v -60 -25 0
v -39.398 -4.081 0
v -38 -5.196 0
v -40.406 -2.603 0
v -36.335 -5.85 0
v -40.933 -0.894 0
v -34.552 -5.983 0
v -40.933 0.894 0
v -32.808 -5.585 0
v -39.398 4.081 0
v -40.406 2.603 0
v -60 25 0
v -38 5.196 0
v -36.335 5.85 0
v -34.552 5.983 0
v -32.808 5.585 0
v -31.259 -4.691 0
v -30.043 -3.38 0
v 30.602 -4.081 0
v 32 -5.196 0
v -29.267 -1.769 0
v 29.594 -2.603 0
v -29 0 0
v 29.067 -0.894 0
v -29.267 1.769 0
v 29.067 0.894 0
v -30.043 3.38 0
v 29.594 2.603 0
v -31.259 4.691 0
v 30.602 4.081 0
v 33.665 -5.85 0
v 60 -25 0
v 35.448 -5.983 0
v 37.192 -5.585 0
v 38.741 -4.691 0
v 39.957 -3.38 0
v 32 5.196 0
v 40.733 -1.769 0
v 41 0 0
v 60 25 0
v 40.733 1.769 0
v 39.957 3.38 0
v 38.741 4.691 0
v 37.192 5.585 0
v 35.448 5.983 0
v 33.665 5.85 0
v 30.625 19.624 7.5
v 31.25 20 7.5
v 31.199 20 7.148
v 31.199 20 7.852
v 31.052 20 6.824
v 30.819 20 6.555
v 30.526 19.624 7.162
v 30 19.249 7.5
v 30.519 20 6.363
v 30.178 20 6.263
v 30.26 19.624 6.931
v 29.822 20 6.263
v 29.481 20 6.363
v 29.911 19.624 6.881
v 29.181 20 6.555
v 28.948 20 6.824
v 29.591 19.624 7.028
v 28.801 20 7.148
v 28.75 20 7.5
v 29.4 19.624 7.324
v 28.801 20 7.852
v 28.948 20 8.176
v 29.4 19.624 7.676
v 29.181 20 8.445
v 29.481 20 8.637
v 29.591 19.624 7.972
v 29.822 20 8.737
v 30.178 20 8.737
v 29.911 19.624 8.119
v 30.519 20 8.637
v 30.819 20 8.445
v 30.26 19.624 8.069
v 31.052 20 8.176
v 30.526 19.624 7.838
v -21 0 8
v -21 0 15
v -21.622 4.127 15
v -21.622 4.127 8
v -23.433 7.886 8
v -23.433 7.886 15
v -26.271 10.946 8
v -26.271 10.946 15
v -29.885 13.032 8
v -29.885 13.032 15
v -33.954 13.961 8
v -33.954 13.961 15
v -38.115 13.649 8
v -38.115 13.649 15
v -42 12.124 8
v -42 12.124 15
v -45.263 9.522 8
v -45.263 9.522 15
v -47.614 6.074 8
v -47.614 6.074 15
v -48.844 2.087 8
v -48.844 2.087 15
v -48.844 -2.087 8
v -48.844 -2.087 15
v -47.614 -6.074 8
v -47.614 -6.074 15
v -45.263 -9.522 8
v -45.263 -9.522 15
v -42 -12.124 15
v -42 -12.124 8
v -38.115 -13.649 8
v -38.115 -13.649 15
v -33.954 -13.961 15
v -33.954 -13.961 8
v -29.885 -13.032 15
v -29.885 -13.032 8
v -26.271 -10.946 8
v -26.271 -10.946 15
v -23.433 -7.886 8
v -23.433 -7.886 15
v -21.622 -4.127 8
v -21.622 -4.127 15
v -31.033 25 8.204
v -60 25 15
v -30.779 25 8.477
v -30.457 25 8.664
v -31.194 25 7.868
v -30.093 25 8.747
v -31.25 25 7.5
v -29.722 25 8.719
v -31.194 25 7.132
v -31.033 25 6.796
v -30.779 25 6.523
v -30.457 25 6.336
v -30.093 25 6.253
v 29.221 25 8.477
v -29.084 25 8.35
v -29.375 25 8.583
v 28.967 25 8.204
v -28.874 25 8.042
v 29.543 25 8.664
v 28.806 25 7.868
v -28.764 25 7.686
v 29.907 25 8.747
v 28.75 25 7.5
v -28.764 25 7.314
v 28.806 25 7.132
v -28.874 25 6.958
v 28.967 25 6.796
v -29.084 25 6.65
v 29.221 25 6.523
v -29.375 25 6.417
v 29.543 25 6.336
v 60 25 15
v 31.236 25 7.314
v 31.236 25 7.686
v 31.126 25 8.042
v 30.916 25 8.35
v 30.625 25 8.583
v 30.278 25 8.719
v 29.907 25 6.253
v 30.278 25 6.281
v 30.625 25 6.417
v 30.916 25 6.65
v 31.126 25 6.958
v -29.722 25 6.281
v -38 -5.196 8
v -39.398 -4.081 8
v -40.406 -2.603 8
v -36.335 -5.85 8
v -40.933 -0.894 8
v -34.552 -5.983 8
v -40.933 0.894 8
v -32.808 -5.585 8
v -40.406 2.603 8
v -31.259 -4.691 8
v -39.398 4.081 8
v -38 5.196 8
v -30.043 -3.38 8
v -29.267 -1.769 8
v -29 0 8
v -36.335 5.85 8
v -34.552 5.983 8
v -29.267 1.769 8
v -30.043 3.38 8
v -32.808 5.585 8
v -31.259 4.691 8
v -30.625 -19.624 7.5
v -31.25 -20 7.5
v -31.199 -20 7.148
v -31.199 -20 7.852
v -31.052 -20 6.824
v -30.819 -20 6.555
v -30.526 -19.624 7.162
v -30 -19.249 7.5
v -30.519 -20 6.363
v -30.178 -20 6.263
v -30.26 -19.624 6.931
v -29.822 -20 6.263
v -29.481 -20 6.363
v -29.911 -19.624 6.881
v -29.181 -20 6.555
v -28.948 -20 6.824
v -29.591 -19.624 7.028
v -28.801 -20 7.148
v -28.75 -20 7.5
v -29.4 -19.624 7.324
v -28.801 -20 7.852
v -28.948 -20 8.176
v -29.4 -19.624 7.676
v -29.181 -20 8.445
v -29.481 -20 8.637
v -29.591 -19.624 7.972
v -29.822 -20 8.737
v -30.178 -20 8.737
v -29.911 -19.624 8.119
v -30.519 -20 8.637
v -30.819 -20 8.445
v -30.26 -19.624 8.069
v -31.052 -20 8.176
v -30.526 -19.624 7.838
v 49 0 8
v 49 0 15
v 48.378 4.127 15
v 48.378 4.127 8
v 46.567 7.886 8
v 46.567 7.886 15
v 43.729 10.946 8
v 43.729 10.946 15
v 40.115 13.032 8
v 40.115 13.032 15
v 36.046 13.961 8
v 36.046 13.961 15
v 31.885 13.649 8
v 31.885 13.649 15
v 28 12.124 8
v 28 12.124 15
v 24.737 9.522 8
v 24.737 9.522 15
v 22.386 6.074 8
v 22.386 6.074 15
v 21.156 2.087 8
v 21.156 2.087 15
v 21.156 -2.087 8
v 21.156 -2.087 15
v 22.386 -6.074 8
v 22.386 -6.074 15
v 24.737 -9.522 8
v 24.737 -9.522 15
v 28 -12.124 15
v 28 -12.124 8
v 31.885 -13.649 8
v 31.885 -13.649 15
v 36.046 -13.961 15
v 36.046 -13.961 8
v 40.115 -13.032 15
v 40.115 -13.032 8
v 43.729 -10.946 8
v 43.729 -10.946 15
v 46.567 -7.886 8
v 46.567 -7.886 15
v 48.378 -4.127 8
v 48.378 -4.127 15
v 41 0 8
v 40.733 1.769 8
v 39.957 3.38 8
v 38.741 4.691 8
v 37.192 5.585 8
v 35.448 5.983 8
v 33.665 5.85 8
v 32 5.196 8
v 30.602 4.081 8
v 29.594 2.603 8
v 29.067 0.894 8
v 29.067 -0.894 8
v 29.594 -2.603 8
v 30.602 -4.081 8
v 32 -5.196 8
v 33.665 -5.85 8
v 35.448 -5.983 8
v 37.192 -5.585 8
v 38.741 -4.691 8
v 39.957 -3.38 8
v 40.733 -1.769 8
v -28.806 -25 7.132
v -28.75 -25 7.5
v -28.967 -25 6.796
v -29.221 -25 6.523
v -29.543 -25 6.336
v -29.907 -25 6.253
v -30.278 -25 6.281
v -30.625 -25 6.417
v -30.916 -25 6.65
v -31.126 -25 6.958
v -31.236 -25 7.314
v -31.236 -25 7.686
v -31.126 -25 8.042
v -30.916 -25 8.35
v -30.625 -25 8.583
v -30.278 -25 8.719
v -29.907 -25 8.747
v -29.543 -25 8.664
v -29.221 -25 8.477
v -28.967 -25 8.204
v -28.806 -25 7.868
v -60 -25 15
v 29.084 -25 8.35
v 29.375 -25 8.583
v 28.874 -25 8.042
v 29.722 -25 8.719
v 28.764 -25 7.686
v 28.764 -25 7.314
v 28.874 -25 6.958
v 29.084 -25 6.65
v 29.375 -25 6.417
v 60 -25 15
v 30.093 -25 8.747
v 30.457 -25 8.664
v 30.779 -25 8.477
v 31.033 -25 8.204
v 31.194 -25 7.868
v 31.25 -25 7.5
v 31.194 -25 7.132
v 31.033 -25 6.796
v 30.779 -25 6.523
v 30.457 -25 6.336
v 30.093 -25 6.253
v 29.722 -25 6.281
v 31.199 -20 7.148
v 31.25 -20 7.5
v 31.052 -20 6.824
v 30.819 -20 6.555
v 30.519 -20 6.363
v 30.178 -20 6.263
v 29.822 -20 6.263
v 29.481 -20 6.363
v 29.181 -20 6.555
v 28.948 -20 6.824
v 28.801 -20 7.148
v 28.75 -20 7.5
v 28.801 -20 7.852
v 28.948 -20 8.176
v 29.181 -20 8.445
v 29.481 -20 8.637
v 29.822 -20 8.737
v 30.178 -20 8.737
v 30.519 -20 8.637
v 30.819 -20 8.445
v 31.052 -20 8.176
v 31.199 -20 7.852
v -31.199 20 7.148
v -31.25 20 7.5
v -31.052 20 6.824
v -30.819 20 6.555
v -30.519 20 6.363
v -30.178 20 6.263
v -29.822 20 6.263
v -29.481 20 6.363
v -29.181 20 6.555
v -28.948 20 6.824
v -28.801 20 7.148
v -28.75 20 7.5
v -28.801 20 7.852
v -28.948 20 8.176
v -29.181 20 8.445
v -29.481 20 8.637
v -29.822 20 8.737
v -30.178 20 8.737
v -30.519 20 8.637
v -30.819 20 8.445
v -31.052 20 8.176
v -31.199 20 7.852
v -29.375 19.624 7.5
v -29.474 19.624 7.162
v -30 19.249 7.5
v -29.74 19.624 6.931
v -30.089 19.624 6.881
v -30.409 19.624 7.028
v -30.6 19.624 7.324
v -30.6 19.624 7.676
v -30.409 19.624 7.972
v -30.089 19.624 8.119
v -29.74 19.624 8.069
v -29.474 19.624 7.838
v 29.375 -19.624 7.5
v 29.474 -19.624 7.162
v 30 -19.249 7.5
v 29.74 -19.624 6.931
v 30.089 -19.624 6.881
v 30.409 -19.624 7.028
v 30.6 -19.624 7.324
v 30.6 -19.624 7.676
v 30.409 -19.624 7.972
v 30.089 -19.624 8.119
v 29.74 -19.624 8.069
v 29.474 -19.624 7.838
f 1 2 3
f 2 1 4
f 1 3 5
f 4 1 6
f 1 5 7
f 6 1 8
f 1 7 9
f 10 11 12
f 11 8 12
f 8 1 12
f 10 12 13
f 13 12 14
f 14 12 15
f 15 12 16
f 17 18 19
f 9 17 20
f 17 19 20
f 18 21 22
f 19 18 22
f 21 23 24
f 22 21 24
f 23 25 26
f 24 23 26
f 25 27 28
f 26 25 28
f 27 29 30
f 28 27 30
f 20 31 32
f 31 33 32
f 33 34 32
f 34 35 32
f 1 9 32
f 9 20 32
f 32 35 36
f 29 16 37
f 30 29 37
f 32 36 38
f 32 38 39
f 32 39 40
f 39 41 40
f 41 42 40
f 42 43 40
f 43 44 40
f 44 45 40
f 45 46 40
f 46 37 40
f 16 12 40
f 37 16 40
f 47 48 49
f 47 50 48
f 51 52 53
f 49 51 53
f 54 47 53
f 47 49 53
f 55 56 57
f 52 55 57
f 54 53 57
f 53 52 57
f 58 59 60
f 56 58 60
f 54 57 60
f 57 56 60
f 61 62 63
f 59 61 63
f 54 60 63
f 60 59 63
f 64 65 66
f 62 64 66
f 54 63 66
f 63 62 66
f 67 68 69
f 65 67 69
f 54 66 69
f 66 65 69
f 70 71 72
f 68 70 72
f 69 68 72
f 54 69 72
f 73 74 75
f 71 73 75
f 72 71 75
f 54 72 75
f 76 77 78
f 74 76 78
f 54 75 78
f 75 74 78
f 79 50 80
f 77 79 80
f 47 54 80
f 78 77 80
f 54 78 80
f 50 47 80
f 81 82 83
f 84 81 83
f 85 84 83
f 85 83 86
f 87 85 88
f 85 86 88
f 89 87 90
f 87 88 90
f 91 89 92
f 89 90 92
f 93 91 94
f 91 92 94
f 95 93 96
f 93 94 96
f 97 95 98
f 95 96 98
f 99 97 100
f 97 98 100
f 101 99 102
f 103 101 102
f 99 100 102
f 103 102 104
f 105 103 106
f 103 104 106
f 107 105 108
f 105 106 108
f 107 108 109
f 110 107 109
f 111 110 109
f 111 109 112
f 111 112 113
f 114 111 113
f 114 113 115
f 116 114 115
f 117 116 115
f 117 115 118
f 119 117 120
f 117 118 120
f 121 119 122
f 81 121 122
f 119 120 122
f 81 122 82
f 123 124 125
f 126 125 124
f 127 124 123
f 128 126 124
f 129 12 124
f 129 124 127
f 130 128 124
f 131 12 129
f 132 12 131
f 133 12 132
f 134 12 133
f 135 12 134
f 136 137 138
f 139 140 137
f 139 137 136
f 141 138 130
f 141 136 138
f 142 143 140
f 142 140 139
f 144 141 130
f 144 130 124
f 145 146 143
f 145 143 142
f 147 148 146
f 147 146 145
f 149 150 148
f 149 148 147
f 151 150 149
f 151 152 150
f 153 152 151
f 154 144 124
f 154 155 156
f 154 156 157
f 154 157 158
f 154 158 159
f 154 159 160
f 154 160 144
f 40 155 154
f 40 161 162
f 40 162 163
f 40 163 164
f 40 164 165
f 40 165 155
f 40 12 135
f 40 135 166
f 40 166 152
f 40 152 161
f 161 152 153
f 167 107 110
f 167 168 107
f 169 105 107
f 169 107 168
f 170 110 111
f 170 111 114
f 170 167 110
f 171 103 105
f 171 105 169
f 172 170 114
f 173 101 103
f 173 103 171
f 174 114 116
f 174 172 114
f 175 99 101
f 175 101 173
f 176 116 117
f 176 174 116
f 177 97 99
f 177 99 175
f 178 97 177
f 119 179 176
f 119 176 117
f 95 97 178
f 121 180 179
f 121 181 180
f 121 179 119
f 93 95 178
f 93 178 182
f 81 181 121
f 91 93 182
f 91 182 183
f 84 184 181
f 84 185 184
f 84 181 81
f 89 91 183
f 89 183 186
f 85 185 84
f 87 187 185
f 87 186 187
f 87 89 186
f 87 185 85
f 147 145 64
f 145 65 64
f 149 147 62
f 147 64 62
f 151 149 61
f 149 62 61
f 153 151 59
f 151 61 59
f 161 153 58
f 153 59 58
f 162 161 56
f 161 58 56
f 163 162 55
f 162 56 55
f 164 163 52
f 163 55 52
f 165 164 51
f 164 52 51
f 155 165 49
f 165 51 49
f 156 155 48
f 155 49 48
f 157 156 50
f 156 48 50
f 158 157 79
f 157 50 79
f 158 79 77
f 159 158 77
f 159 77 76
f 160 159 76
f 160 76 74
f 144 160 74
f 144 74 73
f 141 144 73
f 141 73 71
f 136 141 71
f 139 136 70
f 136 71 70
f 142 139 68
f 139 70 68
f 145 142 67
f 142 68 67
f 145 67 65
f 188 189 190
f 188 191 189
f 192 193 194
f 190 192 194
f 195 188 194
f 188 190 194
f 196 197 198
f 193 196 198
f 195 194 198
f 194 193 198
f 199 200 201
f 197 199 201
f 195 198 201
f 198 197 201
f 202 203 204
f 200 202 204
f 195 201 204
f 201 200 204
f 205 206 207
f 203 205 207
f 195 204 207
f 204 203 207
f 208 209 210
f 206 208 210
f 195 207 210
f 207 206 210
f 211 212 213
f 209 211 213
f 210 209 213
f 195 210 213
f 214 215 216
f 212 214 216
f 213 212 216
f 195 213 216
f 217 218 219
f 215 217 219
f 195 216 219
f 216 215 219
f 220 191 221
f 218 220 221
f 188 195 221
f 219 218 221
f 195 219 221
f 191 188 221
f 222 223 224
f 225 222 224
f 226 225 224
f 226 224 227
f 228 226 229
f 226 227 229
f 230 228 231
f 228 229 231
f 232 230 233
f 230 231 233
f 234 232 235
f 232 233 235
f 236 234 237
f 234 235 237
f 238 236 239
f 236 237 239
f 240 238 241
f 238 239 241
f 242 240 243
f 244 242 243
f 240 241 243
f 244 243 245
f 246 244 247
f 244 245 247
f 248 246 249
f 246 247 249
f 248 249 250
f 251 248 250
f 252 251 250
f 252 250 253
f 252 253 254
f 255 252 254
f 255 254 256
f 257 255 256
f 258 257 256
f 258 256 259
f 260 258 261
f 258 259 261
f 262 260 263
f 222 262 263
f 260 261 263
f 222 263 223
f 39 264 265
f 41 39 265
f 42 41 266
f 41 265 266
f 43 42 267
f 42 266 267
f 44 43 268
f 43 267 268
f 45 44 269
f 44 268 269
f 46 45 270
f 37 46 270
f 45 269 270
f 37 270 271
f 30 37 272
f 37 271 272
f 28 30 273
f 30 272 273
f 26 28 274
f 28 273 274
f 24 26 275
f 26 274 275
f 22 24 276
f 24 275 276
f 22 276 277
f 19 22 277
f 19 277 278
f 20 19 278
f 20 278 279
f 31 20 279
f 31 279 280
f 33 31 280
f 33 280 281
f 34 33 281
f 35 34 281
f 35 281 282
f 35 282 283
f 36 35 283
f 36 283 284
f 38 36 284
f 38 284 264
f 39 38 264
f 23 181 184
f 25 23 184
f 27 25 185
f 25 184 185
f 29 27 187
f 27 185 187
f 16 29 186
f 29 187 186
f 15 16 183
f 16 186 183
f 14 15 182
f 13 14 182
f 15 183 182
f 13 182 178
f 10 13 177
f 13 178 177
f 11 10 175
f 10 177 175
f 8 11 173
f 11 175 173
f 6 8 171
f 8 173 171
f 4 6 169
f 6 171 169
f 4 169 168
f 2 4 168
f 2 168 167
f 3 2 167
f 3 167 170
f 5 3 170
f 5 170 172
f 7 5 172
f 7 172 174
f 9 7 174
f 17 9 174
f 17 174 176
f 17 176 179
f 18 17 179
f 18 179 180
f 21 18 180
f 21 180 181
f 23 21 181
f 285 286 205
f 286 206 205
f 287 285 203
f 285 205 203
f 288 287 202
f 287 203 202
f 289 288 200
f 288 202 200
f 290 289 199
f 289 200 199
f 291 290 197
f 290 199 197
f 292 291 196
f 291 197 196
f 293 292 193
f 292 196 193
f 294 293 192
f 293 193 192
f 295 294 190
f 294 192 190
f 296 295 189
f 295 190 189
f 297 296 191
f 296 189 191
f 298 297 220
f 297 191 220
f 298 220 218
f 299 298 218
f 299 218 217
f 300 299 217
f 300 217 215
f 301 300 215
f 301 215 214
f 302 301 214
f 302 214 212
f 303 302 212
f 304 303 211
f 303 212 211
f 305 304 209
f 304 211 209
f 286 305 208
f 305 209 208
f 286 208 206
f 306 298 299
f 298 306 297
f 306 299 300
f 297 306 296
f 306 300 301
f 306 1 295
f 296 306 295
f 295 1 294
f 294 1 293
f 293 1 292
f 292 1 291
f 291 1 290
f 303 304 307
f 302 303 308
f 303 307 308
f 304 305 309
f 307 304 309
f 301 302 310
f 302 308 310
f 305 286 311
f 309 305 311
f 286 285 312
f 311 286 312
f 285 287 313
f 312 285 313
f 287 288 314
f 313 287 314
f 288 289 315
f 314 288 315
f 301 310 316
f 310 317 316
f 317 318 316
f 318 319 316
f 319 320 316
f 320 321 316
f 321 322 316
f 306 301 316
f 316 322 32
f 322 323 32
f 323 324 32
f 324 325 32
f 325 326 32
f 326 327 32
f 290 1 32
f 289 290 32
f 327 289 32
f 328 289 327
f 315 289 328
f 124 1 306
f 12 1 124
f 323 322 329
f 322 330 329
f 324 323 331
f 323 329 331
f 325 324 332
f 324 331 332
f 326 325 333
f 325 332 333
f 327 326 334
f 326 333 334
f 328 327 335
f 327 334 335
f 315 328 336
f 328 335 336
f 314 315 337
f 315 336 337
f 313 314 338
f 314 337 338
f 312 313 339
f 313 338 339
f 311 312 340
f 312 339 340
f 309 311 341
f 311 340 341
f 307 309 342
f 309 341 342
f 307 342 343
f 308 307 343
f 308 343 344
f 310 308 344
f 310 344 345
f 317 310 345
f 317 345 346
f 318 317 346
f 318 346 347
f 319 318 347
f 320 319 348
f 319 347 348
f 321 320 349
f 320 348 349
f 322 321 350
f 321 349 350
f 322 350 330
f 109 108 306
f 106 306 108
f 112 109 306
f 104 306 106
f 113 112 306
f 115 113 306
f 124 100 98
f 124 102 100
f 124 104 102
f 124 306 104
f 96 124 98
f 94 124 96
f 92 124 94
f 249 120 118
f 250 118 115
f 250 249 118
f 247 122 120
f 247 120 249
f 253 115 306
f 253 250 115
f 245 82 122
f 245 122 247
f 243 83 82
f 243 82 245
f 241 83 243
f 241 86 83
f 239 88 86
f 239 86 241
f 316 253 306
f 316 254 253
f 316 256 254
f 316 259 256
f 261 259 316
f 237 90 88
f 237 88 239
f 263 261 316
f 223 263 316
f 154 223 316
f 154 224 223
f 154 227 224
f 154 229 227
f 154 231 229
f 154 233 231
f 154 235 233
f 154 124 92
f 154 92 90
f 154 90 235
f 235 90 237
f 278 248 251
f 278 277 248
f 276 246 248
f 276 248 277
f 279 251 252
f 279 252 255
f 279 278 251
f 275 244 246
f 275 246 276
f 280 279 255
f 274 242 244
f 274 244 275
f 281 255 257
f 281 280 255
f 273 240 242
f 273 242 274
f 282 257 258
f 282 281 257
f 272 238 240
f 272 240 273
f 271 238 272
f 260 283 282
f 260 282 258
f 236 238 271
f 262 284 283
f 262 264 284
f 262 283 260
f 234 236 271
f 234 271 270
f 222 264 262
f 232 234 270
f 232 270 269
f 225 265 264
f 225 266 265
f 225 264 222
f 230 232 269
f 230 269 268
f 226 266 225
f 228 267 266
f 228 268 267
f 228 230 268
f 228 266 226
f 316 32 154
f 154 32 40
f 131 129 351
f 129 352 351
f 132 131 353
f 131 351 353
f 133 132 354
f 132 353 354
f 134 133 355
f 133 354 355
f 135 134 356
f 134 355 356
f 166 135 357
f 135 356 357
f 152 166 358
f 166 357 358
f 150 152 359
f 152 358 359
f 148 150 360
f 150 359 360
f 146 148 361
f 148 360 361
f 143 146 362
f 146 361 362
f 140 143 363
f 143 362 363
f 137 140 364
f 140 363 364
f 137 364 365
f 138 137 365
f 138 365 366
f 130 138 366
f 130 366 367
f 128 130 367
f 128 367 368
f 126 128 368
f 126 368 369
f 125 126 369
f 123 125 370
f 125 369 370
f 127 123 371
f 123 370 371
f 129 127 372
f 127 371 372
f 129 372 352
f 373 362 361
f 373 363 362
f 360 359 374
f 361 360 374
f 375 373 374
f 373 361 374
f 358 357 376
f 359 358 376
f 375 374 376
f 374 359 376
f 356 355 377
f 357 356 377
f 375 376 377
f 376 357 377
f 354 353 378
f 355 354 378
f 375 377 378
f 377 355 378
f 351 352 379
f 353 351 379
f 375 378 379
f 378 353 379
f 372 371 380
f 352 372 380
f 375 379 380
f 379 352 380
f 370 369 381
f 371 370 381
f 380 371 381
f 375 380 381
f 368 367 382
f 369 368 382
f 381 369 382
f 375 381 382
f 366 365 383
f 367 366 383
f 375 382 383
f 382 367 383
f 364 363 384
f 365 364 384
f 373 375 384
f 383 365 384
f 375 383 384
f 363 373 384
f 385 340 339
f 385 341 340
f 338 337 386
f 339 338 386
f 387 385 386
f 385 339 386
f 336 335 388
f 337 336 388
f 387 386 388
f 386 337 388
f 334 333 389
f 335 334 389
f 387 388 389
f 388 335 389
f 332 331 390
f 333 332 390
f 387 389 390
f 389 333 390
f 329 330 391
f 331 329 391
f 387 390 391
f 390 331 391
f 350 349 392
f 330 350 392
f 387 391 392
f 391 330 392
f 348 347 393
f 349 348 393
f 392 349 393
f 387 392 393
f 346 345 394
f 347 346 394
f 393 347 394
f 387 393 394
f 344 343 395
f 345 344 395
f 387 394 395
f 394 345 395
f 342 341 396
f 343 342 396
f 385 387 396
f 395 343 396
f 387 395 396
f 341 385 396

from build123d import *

# Parameters (mm, degrees)
SKETCH_1_W             = 120
SKETCH_1_H             = 50
EXTRUDE_1_DEPTH        = 15
CUT_EXTRUDE_1_REACH    = 68.708
SKETCH_2_R             = 6
HOLE_WIZARD_M3_1_D     = 2.5
HOLE_WIZARD_M3_1_DEPTH = 5
HOLE_WIZARD_M3_1_TIP   = 0.751075774
HOLE_WIZARD_M3_2_D     = 2.5
HOLE_WIZARD_M3_2_DEPTH = 5
HOLE_WIZARD_M3_2_TIP   = 0.751075774
SKETCH_19_R            = 14
CUT_EXTRUDE_3_DEPTH    = 7


with BuildPart() as part:
    # 草图1 → 凸台-拉伸1 (new body)
    with BuildSketch(Plane.XY):
        Rectangle(SKETCH_1_W, SKETCH_1_H)
    extrude(amount=EXTRUDE_1_DEPTH)

    # 草图2 → 切除-拉伸1 (cut, up to next)
    with BuildSketch(Plane.XY.offset(15), mode=Mode.PRIVATE) as cut_extrude_1_sk1:
        with Locations((-35, 0)):
            Circle(SKETCH_2_R)
    cut_extrude_1_tool1 = extrude(cut_extrude_1_sk1.sketch, amount=-CUT_EXTRUDE_1_REACH, mode=Mode.PRIVATE) & part.part
    # 草图2 → 切除-拉伸1 (cut, up to next)
    with BuildSketch(Plane.XY.offset(15), mode=Mode.PRIVATE) as cut_extrude_1_sk2:
        with Locations((35, 0)):
            Circle(SKETCH_2_R)
    cut_extrude_1_tool2 = extrude(cut_extrude_1_sk2.sketch, amount=-CUT_EXTRUDE_1_REACH, mode=Mode.PRIVATE) & part.part
    add(cut_extrude_1_tool1.solids().sort_by_distance((-35, 0, 15))[0], mode=Mode.SUBTRACT)
    add(cut_extrude_1_tool2.solids().sort_by_distance((35, 0, 15))[0], mode=Mode.SUBTRACT)

    # M3 螺纹孔1
    with Locations(Plane(origin=(0, 25, 0), x_dir=(1, 0, 0), z_dir=(0, 1, 0))):
        with Locations((30, -7.5), (-30, -7.5)):
            Hole(HOLE_WIZARD_M3_1_D / 2, depth=HOLE_WIZARD_M3_1_DEPTH)
            with Locations((0, 0, -(HOLE_WIZARD_M3_1_DEPTH + HOLE_WIZARD_M3_1_TIP / 2))):  # 118° drill point
                Cone(0, HOLE_WIZARD_M3_1_D / 2, HOLE_WIZARD_M3_1_TIP, mode=Mode.SUBTRACT)

    # M3 螺纹孔2
    with Locations(Plane(origin=(0, -25, 0), x_dir=(-1, 0, 0), z_dir=(0, -1, 0))):
        with Locations((-30, -7.5), (30, -7.5)):
            Hole(HOLE_WIZARD_M3_2_D / 2, depth=HOLE_WIZARD_M3_2_DEPTH)
            with Locations((0, 0, -(HOLE_WIZARD_M3_2_DEPTH + HOLE_WIZARD_M3_2_TIP / 2))):  # 118° drill point
                Cone(0, HOLE_WIZARD_M3_2_D / 2, HOLE_WIZARD_M3_2_TIP, mode=Mode.SUBTRACT)

    # 草图19 → 切除-拉伸3 (cut)
    with BuildSketch(Plane.XY.offset(15)):
        with Locations((-35, 0)):
            Circle(SKETCH_19_R)
        with Locations((35, 0)):
            Circle(SKETCH_19_R)
    extrude(amount=-CUT_EXTRUDE_3_DEPTH, mode=Mode.SUBTRACT)


solid = part.part
